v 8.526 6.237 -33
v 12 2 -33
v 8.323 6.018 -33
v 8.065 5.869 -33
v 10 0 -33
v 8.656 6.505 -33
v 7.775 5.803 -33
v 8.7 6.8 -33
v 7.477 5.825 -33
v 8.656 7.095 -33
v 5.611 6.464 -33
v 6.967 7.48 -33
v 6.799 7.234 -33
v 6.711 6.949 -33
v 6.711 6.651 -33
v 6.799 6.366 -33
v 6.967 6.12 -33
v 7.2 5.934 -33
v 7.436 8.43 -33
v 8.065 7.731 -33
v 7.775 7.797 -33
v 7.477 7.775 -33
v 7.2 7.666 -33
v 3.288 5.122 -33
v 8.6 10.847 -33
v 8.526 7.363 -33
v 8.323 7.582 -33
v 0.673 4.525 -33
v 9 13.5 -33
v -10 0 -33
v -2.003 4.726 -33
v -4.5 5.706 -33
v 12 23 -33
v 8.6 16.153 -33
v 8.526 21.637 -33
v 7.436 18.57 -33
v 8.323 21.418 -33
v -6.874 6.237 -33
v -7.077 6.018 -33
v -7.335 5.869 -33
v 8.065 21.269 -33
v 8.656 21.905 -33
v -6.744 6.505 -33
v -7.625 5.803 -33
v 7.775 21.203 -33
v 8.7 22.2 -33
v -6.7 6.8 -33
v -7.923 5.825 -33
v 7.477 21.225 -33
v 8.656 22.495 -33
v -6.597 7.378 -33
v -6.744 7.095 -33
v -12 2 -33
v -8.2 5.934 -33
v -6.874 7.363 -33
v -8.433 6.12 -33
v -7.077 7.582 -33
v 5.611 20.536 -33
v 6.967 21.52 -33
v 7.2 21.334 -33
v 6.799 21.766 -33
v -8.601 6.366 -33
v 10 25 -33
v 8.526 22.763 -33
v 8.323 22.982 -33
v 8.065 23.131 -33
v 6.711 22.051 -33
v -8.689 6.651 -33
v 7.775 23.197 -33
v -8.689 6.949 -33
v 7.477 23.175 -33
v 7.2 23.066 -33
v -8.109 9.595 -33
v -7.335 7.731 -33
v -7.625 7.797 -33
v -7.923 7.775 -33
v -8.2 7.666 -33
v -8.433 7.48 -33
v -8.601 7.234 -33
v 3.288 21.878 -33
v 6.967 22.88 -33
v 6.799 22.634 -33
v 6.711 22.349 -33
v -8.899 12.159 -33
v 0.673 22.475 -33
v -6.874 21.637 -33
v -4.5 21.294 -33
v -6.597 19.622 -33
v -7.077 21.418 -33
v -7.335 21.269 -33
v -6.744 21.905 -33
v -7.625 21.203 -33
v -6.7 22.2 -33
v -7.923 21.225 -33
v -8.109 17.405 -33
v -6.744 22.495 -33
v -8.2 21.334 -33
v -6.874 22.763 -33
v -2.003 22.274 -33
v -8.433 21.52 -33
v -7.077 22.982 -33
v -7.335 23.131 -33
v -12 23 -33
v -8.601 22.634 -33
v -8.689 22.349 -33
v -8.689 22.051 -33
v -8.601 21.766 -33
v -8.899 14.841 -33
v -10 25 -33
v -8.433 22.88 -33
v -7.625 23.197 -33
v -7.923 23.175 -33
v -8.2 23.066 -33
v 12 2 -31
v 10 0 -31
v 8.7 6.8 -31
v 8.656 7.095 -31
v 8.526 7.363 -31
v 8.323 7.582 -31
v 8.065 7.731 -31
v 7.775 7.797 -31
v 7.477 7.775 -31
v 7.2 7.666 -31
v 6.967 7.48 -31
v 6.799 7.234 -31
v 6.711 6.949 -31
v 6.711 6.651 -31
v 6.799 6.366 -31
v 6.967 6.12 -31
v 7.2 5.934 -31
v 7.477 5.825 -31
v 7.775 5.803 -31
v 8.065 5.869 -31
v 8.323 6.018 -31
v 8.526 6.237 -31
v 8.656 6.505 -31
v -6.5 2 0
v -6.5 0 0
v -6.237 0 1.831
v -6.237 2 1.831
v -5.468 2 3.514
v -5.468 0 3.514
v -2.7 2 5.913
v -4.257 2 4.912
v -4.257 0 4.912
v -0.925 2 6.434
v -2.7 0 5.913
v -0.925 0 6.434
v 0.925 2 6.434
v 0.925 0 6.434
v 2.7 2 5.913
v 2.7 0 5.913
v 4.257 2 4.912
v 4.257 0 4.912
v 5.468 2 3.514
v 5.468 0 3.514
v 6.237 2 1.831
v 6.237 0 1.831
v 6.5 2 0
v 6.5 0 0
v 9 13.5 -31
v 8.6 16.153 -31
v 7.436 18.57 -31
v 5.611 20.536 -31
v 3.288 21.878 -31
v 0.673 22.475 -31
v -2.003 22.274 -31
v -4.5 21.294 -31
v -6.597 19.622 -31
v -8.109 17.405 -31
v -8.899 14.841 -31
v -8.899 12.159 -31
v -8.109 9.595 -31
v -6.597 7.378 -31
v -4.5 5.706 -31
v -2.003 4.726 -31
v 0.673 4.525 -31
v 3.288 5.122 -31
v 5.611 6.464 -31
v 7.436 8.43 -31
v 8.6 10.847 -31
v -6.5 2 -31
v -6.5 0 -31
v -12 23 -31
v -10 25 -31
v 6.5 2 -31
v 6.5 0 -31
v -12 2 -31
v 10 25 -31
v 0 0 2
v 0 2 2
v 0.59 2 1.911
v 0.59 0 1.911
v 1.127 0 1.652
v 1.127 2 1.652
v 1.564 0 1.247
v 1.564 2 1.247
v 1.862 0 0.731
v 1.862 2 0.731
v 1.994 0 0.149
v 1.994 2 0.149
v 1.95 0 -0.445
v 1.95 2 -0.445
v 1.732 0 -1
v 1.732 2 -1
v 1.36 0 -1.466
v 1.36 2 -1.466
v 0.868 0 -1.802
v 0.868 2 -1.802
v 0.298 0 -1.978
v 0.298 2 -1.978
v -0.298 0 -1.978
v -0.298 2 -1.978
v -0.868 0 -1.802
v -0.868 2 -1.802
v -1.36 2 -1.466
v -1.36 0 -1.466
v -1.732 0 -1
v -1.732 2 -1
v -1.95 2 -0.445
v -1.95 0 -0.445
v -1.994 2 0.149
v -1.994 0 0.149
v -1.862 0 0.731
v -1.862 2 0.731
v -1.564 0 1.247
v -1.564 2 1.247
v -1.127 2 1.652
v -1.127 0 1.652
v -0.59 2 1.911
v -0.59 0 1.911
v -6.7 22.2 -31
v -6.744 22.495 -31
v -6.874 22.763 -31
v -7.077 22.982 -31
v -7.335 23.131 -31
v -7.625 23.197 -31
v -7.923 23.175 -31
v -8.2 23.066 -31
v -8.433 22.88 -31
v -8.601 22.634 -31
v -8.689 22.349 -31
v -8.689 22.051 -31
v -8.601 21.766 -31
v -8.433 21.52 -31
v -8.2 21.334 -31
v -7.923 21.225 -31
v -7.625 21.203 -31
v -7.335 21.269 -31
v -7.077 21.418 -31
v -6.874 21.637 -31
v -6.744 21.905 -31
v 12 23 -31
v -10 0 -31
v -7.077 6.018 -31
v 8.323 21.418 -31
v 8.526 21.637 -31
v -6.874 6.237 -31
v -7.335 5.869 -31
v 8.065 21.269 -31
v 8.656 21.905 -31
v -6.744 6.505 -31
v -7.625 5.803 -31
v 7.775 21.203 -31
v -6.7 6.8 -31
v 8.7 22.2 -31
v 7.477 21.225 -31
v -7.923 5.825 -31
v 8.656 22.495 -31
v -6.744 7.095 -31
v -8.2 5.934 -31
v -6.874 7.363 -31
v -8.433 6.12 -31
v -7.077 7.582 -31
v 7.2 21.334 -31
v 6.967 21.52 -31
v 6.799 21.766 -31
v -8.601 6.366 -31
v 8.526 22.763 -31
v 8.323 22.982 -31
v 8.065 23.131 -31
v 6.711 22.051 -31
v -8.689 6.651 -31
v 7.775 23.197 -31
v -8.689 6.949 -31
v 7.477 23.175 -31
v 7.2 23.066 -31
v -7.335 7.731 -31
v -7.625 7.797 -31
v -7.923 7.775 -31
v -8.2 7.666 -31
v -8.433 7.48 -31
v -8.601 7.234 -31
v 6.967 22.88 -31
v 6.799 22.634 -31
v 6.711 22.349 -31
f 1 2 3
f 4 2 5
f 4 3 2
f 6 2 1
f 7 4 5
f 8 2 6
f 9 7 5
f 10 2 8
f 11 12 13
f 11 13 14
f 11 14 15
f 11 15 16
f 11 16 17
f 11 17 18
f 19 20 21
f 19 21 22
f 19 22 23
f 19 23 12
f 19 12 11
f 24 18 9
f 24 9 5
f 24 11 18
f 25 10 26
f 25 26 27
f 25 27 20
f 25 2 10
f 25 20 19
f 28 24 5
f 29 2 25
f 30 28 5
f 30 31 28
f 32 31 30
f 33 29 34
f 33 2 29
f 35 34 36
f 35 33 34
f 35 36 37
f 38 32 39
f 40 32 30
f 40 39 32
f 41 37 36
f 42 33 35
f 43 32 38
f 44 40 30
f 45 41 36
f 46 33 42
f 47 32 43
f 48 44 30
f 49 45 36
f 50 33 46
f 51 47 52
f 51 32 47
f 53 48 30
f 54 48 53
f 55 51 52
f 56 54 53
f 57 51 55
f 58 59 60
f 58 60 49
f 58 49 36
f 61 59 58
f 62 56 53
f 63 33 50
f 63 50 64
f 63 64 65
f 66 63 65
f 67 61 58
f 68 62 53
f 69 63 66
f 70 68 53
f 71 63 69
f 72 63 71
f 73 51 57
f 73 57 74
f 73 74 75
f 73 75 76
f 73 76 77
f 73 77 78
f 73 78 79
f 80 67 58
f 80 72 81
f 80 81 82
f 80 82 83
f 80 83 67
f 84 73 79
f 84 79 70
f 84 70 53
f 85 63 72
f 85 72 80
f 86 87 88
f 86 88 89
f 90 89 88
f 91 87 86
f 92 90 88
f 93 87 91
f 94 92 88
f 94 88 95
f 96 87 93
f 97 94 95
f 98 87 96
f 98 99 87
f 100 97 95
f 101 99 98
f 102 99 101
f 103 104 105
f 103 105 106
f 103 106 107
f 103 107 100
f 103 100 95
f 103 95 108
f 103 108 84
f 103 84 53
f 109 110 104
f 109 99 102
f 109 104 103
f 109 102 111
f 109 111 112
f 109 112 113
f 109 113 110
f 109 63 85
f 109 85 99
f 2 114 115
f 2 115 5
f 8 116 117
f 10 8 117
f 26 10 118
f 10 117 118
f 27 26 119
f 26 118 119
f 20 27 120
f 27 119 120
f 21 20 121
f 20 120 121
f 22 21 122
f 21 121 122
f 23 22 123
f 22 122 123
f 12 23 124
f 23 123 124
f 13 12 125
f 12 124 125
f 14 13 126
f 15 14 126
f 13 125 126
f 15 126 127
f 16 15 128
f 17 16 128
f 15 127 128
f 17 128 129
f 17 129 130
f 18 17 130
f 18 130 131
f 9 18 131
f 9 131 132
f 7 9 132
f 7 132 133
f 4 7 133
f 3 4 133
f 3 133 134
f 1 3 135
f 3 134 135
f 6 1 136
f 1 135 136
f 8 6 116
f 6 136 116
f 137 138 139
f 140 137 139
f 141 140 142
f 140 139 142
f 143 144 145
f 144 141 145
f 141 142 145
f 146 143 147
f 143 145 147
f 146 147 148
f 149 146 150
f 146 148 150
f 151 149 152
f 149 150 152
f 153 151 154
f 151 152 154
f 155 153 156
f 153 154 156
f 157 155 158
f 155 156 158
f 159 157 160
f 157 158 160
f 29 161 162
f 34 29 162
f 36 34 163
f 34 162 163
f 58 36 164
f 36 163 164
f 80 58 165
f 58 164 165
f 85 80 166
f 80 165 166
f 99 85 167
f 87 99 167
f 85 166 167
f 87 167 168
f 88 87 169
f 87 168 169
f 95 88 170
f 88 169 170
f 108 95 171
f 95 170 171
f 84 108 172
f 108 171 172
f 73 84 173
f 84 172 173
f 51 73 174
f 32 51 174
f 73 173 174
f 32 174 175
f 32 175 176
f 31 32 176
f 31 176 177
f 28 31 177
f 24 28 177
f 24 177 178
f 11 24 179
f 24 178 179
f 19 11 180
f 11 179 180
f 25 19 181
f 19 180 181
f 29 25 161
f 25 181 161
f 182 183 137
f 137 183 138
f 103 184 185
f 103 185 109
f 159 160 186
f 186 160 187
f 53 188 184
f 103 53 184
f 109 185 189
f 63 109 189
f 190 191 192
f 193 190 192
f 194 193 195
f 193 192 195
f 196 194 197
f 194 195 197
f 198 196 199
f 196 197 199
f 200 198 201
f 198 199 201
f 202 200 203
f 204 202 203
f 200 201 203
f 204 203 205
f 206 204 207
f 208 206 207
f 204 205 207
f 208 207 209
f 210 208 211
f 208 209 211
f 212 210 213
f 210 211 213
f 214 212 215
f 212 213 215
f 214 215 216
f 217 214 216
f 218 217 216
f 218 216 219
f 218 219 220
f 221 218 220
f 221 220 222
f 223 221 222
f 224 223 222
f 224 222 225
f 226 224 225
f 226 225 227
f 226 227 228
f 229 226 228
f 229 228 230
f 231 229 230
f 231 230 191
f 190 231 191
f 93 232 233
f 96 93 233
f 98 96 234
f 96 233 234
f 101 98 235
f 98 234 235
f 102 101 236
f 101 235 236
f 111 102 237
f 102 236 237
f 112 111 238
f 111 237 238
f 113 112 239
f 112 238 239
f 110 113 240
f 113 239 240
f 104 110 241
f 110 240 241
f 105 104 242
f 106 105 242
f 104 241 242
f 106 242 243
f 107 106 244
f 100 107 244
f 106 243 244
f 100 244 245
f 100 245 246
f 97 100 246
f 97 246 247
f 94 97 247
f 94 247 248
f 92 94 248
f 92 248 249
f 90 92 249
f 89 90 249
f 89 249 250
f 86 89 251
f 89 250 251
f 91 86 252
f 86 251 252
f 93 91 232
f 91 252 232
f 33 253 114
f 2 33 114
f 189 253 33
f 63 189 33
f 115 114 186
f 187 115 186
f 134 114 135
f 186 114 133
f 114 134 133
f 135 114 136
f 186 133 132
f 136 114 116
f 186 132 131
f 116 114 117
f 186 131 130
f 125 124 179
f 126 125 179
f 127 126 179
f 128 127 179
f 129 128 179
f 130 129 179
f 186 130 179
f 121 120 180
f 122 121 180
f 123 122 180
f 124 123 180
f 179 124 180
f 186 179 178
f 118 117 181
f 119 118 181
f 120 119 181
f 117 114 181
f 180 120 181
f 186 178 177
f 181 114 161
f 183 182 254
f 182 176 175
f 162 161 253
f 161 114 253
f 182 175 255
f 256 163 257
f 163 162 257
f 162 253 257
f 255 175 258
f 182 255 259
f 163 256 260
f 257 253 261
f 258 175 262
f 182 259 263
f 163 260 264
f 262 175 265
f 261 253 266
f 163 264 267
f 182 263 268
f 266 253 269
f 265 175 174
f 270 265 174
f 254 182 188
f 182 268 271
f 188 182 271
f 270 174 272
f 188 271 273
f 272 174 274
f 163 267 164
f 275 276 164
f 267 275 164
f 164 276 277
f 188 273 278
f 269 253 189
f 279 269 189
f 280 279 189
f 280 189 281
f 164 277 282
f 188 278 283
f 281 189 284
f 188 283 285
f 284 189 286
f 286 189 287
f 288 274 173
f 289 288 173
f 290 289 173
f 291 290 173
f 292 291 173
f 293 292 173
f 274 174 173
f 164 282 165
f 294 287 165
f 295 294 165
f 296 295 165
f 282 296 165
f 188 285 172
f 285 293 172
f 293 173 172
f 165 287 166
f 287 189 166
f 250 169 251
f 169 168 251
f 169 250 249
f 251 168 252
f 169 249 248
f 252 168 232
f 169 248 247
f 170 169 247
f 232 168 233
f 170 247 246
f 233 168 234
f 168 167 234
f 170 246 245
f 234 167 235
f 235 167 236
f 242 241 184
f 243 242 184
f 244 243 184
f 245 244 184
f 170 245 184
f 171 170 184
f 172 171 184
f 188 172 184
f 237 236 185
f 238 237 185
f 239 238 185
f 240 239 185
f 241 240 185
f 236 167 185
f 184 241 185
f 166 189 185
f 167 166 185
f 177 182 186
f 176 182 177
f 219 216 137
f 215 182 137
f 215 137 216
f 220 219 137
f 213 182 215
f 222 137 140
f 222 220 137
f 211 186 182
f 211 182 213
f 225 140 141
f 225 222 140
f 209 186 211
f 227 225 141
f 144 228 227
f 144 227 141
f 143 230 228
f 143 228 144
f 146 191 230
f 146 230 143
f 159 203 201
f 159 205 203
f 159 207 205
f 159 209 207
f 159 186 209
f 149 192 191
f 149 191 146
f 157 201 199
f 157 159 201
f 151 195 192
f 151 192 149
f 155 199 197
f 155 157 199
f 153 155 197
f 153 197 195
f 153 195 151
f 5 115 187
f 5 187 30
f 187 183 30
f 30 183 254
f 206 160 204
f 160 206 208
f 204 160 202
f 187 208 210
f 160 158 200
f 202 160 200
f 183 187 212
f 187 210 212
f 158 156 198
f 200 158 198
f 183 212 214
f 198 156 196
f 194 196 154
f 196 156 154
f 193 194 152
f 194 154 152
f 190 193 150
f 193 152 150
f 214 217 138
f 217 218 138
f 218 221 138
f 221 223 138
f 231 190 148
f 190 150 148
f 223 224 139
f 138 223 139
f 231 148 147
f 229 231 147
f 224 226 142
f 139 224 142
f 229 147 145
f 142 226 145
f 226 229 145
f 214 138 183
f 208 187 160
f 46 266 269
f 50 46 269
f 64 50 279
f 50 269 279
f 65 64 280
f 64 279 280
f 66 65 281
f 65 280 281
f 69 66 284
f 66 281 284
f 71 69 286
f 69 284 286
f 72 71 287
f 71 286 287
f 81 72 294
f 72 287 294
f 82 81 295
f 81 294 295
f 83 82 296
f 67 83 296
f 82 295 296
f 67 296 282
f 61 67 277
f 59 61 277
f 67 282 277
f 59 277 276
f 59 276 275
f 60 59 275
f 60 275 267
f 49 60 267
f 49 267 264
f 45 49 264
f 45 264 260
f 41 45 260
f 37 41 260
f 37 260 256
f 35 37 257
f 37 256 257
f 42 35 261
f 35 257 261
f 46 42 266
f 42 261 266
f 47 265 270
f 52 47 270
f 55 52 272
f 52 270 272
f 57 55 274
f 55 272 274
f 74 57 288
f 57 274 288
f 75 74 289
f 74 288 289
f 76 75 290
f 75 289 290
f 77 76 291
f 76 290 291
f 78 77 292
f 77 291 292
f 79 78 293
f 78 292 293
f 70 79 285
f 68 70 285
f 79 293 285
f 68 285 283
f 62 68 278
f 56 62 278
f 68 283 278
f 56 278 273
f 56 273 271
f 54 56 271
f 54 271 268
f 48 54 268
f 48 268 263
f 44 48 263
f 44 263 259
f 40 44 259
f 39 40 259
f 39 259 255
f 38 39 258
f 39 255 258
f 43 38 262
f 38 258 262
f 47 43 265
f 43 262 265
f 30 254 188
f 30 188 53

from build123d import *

# Parameters (mm, degrees)
SKETCH_2_R          = 6.5
EXTRUDE_1_DEPTH     = 2
SKETCH_3_R          = 2
CUT_EXTRUDE_2_DEPTH = 10.407443861
EXTRUDE_START       = -2
EXTRUDE_2_DEPTH     = 2
EXTRUDE_3_DEPTH     = 2
SKETCH_22_R         = 9
SKETCH_22_R_2       = 1
CUT_EXTRUDE_4_DEPTH = 2
CHAMFER_1_SIZE      = 2


with BuildPart() as part:
    # 草图2 → 凸台-拉伸1 (new body)
    with BuildSketch(Plane(origin=(0, 0, 0), x_dir=(1, 0, 0), z_dir=(0, 1, 0))):
        with Locations(Location((0, 0, 0), (0, 0, 270))):
            Circle(SKETCH_2_R)
    extrude(amount=EXTRUDE_1_DEPTH)

    # 草图3 → 切除-拉伸2 (cut, through all)
    with BuildSketch(Plane(origin=(0, 2, 0), x_dir=(1, 0, 0), z_dir=(0, 1, 0))):
        with Locations(Location((0, 0, 0), (0, 0, 270))):
            Circle(SKETCH_3_R)
    extrude(amount=-CUT_EXTRUDE_2_DEPTH, mode=Mode.SUBTRACT)

    # 草图4 → 凸台-拉伸2 (add)
    with BuildSketch(Plane(origin=(0, 2, 0), x_dir=(1, 0, 0), z_dir=(0, 1, 0)).offset(EXTRUDE_START)):
        with BuildLine():
            Line((6.5, 0), (6.5, 31))
            Line((6.5, 31), (3.899148682, 31))
            Line((3.899148682, 31), (-4.100851318, 31))
            Line((-4.100851318, 31), (-6.5, 31))
            Line((-6.5, 31), (-6.5, 0))
            ThreePointArc((-6.5, 0), (0, 6.5), (6.5, 0))
        make_face()
    extrude(amount=EXTRUDE_2_DEPTH)

    # 草图21 → 凸台-拉伸3 (add)
    with BuildSketch(Plane(origin=(0, 0, -31), x_dir=(-1, 0, 0), z_dir=(0, 0, -1))):
        Polygon((0, 0), (12, 0), (12, 25), (-12, 25), (-12, 0), align=None)
    extrude(amount=EXTRUDE_3_DEPTH)

    # 草图22 → 切除-拉伸4 (cut)
    with BuildSketch(Plane.XY.offset(-31)):
        with Locations((0, 13.5)):
            Circle(SKETCH_22_R)
        with Locations((7.7, 22.2)):
            Circle(SKETCH_22_R_2)
        with Locations((-7.7, 22.2)):
            Circle(SKETCH_22_R_2)
        with Locations((-7.7, 6.8)):
            Circle(SKETCH_22_R_2)
        with Locations((7.7, 6.8)):
            Circle(SKETCH_22_R_2)
    extrude(amount=-CUT_EXTRUDE_4_DEPTH, mode=Mode.SUBTRACT)

    # 倒角1
    chamfer_1_edges = [part.edges().sort_by_distance(p)[0] for p in [
        (12, 0, -32),
        (-12, 0, -32),
        (-12, 25, -32),
        (12, 25, -32),
    ]]
    chamfer(chamfer_1_edges, length=CHAMFER_1_SIZE)


solid = part.part
